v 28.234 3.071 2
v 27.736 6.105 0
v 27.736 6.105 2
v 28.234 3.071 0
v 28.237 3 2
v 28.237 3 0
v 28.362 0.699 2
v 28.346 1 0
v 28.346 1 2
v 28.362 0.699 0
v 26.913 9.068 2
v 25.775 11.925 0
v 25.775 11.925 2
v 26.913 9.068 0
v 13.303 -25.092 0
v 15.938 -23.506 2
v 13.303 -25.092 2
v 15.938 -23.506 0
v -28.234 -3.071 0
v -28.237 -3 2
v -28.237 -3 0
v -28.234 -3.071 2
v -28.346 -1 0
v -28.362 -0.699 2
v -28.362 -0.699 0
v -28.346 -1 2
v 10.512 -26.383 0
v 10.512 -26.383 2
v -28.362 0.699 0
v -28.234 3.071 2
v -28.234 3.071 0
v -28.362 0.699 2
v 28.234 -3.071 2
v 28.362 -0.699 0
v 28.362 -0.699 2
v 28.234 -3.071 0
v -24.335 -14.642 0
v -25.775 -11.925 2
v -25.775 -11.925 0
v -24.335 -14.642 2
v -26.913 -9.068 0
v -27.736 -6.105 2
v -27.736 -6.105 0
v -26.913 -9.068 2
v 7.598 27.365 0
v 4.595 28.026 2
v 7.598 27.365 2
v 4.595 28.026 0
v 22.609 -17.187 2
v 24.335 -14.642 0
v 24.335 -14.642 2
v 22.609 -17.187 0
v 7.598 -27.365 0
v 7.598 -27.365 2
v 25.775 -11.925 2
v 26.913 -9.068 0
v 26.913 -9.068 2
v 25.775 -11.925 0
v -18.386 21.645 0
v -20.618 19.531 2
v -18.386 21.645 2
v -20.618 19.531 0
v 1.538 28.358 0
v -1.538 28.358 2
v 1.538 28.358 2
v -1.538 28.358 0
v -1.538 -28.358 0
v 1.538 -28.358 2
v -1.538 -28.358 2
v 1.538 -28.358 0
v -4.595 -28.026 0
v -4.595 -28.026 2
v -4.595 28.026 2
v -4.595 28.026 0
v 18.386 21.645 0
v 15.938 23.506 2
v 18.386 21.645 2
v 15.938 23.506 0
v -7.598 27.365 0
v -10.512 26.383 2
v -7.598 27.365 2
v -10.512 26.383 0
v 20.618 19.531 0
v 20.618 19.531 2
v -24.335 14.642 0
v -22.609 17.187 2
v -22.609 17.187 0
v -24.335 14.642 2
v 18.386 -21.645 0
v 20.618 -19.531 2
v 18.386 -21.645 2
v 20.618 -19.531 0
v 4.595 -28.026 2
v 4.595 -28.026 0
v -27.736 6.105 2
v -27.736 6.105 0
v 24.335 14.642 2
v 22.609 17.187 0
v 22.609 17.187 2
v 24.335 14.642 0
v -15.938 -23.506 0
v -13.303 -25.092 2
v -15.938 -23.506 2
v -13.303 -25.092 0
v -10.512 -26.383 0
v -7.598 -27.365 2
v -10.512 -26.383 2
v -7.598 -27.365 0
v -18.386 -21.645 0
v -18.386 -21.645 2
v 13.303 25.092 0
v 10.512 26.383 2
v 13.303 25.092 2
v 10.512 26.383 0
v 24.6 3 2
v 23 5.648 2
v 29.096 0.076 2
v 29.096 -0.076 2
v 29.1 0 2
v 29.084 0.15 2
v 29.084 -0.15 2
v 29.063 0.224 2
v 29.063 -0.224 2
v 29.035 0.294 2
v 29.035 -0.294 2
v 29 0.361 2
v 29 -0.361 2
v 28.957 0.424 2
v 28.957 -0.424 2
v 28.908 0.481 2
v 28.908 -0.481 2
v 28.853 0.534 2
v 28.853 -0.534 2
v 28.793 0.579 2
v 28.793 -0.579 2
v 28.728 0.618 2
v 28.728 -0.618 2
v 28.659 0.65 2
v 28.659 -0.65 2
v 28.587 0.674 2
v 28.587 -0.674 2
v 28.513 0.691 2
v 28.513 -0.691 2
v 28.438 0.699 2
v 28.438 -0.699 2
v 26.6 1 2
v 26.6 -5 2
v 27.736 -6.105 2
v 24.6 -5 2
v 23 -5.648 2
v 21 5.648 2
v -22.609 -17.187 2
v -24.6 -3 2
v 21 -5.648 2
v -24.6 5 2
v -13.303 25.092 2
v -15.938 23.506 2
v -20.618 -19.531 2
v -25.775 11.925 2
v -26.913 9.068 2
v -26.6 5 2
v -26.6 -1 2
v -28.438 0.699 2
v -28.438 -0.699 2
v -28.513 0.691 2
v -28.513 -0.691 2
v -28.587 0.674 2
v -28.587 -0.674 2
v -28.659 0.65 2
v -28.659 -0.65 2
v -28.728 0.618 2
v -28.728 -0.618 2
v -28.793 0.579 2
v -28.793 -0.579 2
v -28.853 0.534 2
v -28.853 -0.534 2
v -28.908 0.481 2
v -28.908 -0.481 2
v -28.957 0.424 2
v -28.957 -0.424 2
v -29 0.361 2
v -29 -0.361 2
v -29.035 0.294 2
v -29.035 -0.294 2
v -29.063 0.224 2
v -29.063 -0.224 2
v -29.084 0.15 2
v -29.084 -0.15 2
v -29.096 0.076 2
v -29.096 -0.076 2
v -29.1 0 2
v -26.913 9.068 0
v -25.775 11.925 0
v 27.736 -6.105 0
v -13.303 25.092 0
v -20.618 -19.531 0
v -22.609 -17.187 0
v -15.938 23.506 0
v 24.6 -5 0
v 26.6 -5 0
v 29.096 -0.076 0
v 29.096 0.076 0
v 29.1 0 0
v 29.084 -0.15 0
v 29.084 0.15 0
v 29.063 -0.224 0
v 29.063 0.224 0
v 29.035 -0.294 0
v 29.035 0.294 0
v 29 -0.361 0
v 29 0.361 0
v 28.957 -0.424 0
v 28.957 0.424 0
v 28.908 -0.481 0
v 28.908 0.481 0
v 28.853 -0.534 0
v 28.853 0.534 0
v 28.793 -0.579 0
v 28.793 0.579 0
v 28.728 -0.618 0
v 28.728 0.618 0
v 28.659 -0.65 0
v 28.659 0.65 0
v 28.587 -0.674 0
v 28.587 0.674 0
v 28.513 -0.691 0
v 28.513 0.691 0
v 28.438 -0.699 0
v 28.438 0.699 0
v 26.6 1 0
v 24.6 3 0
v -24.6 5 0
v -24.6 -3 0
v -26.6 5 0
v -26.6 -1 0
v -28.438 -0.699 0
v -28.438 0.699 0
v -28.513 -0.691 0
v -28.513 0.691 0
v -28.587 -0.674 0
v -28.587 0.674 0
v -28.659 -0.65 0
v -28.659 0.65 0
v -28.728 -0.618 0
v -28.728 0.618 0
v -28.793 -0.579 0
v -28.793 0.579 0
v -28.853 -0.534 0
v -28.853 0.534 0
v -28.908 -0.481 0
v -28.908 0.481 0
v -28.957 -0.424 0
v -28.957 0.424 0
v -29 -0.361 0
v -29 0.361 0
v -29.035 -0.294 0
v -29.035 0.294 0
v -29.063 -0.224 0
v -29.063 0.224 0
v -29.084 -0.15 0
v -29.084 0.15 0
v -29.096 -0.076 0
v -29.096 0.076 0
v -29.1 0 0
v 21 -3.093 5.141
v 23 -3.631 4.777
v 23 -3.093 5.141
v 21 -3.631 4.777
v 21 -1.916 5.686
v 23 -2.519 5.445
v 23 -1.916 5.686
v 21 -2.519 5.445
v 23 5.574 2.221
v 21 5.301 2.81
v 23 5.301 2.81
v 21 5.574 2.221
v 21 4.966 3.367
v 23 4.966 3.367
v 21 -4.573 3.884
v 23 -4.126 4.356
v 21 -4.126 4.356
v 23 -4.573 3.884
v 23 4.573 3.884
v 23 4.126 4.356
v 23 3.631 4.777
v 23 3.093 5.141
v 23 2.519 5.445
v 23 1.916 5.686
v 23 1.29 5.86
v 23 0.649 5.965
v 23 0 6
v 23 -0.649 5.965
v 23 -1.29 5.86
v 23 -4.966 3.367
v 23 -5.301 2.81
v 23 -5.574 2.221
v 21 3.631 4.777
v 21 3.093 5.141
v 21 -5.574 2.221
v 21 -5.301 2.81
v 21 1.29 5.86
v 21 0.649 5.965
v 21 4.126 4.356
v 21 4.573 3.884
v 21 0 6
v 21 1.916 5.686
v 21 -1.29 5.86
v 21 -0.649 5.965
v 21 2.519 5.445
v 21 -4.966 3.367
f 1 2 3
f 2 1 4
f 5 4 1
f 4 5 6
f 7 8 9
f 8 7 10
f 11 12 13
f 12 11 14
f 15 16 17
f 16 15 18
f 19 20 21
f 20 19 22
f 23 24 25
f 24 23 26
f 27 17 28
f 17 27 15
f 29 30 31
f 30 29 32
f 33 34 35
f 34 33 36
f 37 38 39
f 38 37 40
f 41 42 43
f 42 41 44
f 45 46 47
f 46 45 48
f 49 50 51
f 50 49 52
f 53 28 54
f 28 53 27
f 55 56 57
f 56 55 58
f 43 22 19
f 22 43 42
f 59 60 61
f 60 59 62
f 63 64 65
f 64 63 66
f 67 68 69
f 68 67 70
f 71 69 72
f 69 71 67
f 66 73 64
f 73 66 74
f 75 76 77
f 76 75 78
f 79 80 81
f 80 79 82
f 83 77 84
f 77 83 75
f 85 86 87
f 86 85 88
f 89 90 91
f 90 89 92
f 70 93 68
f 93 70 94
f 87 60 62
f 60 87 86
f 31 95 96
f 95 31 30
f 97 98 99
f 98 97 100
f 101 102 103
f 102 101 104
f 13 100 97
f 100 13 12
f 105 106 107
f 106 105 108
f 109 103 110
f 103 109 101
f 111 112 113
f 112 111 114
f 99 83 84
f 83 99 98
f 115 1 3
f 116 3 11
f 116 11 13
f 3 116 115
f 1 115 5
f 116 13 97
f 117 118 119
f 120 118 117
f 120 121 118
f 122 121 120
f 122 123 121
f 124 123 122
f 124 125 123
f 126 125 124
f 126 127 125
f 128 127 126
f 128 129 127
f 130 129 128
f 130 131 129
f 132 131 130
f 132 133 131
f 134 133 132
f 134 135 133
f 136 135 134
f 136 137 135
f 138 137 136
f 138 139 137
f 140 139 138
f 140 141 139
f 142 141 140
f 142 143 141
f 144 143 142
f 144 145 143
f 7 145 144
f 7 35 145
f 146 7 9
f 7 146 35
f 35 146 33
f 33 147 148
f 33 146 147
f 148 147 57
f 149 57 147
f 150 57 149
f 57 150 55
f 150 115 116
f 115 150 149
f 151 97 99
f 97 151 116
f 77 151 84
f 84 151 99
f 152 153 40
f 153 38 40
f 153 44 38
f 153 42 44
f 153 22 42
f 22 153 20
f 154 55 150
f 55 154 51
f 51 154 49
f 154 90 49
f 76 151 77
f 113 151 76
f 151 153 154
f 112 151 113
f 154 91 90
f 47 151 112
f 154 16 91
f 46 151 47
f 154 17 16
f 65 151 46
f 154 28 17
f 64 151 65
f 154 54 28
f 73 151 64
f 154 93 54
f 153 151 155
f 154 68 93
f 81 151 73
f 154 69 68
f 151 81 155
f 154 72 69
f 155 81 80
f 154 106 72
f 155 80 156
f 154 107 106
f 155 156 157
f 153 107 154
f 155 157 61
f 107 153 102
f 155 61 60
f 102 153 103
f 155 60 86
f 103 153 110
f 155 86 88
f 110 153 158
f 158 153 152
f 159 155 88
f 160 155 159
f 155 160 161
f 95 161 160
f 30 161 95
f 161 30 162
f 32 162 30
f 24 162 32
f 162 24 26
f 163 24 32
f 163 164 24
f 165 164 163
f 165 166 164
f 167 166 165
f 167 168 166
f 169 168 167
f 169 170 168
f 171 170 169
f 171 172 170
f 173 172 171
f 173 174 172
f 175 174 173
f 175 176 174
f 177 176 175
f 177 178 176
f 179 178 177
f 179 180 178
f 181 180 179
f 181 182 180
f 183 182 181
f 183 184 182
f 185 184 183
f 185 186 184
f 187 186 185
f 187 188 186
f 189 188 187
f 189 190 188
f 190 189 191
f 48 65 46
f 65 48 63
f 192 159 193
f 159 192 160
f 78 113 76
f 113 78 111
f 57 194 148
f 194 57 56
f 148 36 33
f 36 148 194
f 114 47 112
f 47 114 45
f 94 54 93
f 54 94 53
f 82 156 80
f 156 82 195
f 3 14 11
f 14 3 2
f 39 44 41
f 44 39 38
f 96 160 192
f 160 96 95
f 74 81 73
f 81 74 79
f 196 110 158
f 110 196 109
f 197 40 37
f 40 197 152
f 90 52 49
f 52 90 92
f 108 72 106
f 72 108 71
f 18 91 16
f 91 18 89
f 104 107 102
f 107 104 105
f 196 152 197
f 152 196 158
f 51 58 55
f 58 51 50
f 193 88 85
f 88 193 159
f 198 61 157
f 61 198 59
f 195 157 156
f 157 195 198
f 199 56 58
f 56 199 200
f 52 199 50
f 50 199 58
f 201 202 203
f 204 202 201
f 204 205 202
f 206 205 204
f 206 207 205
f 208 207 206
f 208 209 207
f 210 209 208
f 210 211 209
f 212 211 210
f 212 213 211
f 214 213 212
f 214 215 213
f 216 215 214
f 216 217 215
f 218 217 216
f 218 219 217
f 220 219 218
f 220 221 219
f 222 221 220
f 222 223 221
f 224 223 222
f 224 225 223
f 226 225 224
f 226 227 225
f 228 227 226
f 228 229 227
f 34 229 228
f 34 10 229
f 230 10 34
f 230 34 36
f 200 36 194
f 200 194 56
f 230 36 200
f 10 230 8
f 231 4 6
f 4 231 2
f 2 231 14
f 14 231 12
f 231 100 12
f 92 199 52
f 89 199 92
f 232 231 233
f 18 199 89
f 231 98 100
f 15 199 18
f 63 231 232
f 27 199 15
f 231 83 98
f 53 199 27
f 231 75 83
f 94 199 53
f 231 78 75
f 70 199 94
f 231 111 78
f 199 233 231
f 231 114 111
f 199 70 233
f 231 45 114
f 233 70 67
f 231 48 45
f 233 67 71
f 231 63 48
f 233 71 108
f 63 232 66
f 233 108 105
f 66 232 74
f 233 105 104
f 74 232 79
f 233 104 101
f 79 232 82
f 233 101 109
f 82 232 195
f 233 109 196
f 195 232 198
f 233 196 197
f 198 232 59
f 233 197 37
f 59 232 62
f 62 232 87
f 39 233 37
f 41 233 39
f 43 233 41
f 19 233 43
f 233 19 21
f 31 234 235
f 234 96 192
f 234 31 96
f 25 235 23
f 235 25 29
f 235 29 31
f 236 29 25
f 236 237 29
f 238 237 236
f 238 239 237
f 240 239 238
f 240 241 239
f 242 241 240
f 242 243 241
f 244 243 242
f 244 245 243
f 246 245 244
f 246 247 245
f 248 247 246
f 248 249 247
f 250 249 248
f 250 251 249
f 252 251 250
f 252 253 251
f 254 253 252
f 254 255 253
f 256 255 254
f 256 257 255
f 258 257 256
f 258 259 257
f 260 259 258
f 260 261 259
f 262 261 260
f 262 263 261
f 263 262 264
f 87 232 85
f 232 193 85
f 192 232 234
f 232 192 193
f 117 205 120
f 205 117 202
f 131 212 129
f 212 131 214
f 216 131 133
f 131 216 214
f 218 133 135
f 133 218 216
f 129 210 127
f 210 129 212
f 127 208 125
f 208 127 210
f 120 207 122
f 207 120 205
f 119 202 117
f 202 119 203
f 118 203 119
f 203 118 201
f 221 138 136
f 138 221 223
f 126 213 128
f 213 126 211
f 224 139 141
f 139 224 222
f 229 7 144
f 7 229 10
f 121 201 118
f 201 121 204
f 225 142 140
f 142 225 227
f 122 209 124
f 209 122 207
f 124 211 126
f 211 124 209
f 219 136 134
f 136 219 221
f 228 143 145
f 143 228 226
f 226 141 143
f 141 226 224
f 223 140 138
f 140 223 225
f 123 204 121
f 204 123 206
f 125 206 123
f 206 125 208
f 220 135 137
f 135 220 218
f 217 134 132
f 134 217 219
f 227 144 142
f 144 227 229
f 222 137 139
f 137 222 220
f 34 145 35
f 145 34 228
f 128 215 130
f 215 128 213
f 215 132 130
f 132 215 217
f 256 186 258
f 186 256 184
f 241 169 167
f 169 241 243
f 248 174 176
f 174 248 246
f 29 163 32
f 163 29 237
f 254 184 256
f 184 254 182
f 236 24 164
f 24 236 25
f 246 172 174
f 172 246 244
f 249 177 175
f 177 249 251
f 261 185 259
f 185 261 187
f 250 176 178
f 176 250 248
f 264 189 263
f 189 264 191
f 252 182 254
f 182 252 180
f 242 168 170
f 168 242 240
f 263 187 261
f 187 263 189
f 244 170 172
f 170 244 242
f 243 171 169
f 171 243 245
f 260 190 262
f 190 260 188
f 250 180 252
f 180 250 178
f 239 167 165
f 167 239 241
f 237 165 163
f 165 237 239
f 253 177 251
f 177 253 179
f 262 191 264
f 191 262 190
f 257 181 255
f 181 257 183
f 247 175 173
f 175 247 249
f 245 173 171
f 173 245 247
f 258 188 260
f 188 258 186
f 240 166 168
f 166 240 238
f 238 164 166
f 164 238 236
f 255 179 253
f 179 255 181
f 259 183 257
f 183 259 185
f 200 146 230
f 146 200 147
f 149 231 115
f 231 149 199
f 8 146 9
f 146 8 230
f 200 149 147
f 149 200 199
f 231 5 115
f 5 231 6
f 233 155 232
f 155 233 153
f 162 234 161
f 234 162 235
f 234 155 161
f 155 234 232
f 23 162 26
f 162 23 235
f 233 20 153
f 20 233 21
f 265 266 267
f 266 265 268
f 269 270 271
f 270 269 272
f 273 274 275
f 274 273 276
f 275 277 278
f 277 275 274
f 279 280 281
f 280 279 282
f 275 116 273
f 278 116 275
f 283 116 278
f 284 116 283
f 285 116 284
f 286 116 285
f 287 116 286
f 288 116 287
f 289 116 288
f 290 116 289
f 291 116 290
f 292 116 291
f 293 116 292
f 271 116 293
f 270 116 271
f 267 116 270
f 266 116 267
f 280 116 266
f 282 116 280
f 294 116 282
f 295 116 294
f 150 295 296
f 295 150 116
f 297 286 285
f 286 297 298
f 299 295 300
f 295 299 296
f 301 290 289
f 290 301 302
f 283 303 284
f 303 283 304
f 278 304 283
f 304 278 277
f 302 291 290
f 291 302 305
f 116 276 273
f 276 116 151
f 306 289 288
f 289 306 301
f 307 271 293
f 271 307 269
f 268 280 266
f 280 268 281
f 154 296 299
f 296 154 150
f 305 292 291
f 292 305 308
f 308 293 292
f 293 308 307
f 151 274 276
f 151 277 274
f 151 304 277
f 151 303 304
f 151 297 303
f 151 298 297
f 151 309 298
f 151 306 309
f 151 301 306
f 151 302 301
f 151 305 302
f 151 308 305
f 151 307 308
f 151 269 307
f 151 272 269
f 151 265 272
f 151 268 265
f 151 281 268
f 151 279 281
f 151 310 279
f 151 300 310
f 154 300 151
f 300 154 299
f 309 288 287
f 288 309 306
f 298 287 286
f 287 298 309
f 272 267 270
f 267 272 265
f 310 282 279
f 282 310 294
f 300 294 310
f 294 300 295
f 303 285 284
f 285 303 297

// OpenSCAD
//
//clip();

filter_diameter = 58;
reduction_factor = 2;
generate_handle = true;
handle_radius = 6;
// Load a 100x100 pixel image. (images will be automatically stretched to fit) Simple, high contrast images like logos work best.
image_file = "file.dat"; // [image_surface:100x100]


filter_cut(filter_diameter/2,reduction_factor);


module filter_cut(radius, reduction_factor)
{
    $fn=58;
    difference(){
        filter(radius-0.6);
        translate([radius-3.4,-2,0])
            cube([2,6,10], center=true);
        translate([radius-0.9,2,0])
            cube([7,2,10], center=true);
        translate([-(radius-3.4),2,0])
            cube([2,6,10], center=true);
        translate([-(radius-0.9),-2,0])
            cube([7,2,10], center=true);//*/
        resize([radius/reduction_factor,radius/reduction_factor,10]) surface(file=image_file, center=true);
    }
    if (generate_handle) 
    {
        translate([radius-8, 0, 0]) handle(handle_radius);    
    }
}

module handle(handle_radius)
{
    rotate([0,90,0]) difference() {
        cylinder(r=handle_radius, h=2);
        translate([0,-handle_radius,0])cube([handle_radius,2*handle_radius,2]);
    }
}

module filter(radius_transformed) 
{
    cylinder(r=radius_transformed,h=2);
    translate([radius_transformed,0,0])
        cylinder(r=0.7,h=2);
    translate([-radius_transformed,0,0])
        cylinder(r=0.7,h=2);
}
